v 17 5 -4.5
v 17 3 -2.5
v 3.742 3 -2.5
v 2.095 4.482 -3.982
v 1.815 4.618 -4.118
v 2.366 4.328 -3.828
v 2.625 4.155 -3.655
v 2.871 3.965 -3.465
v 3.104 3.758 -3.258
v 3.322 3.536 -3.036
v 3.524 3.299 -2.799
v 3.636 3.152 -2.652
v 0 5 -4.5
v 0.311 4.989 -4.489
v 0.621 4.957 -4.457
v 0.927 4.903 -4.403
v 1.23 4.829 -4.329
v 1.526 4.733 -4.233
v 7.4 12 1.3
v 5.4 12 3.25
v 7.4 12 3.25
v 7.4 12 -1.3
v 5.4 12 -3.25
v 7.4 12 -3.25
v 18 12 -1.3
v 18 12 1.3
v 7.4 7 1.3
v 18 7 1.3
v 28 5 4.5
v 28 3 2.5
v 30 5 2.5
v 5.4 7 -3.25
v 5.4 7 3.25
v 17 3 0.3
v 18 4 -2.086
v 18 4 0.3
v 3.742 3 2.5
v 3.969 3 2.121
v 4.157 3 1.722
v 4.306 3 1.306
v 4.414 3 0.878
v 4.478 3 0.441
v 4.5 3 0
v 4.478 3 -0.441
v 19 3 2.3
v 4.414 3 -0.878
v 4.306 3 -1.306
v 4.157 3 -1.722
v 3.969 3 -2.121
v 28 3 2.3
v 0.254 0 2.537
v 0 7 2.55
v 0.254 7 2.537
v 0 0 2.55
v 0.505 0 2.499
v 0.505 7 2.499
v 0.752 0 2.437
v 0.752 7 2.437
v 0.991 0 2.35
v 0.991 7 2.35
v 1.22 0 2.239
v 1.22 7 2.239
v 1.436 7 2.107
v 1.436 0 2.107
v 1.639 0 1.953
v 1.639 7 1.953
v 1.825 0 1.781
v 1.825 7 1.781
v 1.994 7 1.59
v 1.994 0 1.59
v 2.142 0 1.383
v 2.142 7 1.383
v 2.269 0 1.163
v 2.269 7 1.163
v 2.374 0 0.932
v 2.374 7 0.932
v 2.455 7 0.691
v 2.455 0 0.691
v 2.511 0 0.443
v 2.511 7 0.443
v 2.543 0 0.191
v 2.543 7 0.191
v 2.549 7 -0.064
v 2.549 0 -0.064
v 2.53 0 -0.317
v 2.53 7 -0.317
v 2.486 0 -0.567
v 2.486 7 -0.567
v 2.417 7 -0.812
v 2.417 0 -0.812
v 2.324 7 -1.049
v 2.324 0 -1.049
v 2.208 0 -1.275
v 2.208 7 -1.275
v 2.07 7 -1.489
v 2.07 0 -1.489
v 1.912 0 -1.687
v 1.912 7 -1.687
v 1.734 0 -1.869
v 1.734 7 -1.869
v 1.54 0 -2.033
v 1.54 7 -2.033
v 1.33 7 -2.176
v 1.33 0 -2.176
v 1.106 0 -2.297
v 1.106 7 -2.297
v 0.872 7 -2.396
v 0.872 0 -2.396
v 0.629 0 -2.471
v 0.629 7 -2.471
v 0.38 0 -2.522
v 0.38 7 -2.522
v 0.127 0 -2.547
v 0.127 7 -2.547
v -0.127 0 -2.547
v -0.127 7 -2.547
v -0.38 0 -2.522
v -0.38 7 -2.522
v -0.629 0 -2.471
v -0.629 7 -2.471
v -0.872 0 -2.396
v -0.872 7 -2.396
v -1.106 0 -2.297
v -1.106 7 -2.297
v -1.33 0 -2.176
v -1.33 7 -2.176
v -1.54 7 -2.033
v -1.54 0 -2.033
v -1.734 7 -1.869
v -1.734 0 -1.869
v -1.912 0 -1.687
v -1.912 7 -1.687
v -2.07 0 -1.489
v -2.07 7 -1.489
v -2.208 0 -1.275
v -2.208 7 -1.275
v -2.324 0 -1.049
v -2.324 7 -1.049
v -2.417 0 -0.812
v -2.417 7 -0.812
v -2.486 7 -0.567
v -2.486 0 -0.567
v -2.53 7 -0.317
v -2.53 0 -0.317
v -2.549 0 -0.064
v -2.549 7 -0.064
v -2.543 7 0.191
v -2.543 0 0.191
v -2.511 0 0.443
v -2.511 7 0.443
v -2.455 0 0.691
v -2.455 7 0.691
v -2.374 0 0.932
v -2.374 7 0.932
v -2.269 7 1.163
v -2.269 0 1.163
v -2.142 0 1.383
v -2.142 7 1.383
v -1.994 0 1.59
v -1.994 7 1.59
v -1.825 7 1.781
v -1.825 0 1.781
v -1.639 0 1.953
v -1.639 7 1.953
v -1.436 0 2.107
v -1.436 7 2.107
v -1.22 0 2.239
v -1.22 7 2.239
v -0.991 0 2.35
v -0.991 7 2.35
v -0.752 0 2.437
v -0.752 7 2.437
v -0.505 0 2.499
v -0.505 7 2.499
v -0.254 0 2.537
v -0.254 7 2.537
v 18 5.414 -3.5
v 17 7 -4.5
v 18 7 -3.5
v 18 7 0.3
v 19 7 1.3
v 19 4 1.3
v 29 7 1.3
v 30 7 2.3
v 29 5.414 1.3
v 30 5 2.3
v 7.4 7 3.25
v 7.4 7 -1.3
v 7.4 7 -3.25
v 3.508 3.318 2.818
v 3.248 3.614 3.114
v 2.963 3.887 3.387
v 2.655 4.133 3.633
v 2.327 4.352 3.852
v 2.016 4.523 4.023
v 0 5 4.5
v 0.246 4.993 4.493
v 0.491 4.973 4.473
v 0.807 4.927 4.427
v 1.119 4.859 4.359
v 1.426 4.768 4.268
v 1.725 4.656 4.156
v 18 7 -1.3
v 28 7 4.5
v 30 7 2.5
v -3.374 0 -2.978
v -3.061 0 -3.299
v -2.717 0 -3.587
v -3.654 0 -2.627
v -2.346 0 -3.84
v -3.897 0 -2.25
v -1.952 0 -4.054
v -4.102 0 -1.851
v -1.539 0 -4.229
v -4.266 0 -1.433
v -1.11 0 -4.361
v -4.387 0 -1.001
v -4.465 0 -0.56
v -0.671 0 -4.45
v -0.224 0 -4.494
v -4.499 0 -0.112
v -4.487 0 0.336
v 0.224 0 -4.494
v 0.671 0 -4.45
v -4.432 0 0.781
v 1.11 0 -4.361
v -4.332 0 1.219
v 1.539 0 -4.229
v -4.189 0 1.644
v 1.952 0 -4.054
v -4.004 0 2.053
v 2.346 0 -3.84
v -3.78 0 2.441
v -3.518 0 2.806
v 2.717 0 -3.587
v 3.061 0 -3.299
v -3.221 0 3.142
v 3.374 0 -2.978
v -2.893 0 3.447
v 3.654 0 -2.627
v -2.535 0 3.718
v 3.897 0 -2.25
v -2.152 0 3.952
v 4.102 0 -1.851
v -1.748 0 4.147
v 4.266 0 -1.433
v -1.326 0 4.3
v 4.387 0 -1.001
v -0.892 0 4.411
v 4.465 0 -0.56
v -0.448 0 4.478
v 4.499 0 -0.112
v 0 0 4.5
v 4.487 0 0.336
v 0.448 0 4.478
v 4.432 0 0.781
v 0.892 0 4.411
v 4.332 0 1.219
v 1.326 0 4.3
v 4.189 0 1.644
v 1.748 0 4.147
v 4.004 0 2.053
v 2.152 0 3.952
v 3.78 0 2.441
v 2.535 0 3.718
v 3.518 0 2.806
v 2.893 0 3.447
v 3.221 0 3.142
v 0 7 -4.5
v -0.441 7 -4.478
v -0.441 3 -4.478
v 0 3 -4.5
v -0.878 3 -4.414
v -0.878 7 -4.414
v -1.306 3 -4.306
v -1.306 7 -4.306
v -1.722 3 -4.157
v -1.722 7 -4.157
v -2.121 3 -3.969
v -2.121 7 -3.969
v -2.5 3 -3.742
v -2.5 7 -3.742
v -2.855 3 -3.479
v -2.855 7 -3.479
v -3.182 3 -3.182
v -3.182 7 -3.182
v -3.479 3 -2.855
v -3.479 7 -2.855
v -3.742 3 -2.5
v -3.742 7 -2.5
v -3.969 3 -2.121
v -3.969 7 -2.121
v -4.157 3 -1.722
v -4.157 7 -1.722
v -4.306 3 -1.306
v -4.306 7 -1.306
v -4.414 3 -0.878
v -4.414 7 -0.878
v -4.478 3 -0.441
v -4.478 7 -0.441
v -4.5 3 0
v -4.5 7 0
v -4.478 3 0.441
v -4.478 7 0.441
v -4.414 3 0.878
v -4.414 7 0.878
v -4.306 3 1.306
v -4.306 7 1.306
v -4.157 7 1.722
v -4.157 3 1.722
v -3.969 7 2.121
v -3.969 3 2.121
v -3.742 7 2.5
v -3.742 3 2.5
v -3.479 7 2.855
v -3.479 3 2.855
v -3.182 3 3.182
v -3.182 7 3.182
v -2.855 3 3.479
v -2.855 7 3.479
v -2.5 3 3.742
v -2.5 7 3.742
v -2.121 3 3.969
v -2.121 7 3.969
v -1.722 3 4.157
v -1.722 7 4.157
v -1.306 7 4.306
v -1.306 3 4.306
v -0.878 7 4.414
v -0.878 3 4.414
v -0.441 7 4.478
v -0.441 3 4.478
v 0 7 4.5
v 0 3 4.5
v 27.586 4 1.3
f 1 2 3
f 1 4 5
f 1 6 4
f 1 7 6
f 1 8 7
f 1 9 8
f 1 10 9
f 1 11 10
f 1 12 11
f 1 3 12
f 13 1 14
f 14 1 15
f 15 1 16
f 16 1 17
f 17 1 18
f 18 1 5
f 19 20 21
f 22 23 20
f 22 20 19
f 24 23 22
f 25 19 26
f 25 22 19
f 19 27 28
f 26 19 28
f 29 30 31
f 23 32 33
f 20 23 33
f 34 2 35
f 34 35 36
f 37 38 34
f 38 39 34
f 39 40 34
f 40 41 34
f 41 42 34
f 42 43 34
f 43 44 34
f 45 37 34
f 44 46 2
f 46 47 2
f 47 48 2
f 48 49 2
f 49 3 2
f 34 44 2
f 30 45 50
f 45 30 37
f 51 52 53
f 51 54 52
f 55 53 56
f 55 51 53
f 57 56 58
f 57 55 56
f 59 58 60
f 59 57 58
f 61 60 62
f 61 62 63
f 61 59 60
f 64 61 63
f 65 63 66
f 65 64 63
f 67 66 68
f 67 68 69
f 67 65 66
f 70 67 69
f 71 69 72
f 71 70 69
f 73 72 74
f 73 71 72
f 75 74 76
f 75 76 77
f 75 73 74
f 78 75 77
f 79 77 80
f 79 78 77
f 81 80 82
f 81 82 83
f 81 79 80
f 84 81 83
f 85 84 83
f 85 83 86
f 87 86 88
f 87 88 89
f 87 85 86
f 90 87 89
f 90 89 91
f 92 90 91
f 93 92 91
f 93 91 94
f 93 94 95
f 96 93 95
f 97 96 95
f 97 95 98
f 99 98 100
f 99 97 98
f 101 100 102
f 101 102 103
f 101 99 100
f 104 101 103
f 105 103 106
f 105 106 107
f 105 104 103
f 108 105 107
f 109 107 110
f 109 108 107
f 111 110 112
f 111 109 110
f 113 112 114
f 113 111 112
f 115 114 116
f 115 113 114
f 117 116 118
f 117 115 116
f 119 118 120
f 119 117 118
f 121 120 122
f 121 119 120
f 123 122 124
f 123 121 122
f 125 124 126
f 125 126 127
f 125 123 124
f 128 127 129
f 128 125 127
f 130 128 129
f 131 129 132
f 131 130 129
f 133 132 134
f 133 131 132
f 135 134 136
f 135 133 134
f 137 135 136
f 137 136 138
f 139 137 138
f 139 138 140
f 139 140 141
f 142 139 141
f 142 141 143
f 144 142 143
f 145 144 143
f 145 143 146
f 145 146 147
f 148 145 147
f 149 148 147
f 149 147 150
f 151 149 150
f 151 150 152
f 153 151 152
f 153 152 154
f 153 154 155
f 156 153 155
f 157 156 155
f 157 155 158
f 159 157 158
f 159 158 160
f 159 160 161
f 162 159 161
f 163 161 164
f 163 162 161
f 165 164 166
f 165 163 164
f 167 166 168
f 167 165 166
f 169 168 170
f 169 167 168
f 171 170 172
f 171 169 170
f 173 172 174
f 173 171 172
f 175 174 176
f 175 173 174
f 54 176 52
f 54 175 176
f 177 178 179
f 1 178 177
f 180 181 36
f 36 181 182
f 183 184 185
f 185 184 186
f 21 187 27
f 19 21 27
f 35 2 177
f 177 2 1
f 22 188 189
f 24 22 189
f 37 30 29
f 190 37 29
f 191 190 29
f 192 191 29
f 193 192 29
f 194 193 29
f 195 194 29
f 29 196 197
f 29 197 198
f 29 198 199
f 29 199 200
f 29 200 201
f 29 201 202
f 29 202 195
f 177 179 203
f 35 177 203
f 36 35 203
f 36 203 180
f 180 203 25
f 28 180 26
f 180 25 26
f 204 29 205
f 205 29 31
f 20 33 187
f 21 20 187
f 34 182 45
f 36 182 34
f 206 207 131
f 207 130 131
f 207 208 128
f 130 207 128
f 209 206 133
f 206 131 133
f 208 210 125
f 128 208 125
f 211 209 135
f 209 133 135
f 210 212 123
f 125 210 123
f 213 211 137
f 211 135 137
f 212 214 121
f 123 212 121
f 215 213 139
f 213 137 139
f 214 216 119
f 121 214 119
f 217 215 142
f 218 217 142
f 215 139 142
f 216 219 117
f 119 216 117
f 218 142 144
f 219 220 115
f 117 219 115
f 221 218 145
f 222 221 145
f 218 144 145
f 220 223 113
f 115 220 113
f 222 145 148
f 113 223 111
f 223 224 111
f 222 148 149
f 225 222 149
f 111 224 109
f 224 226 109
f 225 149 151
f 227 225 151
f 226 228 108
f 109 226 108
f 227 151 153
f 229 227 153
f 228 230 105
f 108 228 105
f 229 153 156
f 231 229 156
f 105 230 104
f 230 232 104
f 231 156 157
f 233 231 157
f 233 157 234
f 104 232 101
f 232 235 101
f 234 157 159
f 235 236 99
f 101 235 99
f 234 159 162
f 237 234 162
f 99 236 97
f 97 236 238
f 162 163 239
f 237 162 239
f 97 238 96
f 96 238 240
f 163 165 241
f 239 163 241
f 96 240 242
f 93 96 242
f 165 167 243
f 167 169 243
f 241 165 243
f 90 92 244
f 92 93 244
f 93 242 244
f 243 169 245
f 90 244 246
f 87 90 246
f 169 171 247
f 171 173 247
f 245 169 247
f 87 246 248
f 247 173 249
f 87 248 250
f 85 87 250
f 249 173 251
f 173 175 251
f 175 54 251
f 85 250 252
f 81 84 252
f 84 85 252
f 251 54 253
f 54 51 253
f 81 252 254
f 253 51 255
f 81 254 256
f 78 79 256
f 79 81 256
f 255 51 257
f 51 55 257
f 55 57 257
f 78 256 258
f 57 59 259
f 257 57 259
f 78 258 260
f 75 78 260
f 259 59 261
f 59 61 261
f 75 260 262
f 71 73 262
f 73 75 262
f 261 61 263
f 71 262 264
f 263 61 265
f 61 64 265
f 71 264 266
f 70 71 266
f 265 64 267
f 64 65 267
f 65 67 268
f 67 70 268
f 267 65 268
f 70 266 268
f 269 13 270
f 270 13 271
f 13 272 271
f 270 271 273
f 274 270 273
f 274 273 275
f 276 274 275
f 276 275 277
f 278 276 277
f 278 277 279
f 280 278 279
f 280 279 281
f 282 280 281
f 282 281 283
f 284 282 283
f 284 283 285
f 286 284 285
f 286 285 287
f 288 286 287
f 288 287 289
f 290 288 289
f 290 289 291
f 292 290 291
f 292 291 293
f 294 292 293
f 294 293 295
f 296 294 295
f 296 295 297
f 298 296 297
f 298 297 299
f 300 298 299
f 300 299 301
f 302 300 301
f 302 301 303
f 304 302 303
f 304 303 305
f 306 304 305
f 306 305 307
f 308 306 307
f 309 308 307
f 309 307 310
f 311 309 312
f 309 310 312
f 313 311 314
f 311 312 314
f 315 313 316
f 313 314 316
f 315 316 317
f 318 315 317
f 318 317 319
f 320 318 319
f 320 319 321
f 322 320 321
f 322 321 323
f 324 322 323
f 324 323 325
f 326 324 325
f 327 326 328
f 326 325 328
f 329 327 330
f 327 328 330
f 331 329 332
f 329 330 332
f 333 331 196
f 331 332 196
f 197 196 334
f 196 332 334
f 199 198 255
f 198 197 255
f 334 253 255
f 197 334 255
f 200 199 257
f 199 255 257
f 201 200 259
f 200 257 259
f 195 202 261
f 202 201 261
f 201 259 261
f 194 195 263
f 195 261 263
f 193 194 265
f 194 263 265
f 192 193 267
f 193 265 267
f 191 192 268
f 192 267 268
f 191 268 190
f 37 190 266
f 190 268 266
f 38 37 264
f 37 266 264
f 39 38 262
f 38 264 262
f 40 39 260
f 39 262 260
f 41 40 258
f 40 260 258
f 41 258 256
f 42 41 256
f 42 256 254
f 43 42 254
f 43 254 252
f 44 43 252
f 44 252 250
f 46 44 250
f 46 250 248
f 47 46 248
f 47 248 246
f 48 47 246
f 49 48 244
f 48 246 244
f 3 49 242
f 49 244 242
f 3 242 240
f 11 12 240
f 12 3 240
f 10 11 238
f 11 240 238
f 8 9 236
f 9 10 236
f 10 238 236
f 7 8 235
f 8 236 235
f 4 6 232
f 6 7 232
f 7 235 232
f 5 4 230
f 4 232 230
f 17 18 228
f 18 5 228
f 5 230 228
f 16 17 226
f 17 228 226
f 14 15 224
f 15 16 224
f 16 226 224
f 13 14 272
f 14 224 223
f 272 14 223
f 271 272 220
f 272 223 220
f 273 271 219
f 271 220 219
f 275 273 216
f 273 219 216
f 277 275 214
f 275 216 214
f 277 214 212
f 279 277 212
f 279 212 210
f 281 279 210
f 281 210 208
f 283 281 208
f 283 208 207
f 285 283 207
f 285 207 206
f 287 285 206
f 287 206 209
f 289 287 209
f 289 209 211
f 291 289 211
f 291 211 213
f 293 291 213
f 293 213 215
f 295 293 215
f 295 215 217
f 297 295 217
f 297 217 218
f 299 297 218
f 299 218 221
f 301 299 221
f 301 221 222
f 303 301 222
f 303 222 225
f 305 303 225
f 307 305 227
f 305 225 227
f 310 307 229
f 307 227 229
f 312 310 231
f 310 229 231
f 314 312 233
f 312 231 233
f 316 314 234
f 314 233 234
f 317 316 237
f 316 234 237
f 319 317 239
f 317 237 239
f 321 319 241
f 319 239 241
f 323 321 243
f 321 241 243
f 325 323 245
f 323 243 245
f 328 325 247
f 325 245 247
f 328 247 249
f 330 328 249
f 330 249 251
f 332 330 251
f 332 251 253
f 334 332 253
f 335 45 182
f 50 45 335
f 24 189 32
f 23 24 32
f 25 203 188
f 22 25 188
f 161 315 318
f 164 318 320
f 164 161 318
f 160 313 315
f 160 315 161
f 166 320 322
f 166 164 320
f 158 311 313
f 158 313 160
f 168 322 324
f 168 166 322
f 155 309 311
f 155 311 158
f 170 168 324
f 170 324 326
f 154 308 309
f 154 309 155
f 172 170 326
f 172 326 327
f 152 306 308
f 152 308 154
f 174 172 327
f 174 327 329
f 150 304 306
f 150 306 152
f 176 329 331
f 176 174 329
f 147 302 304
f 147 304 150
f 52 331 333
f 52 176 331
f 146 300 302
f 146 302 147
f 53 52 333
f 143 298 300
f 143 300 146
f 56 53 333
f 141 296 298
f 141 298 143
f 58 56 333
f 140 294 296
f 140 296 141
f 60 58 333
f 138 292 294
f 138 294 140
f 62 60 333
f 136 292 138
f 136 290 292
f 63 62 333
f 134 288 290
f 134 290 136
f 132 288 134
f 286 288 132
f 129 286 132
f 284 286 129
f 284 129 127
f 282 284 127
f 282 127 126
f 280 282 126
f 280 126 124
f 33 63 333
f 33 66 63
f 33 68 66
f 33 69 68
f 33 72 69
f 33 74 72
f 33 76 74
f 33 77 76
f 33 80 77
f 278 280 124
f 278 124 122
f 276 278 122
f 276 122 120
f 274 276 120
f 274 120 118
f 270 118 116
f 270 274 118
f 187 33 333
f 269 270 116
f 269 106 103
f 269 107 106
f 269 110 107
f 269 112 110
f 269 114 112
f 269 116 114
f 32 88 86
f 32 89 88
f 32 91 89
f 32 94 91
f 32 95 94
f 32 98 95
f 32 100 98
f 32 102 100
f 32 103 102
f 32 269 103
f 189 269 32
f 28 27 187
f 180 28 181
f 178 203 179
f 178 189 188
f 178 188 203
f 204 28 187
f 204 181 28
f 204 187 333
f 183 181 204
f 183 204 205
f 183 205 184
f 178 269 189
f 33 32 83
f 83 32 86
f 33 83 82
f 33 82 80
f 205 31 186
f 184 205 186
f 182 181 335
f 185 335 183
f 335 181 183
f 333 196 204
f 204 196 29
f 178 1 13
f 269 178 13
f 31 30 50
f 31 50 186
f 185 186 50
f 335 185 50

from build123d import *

# Parameters (mm, degrees)
SKETCH1_R           = 4.5
SKETCH1_R_2         = 2.55
BOSS_EXTRUDE1_DEPTH = 3
SKETCH2_R           = 2.55
BOSS_EXTRUDE2_DEPTH = 4
CHAMFER1_SIZE       = 2
CUT_EXTRUDE1_DEPTH  = 32.132780152
BOSS_EXTRUDE4_DEPTH = 5
CHAMFER2_SIZE       = 1


with BuildPart() as part:
    # Sketch1 → Boss-Extrude1 (new body)
    with BuildSketch(Plane(origin=(0, 0, 0), x_dir=(1, 0, 0), z_dir=(0, 1, 0))):
        with Locations(Location((0, 0, 0), (0, 0, 270))):
            Circle(SKETCH1_R)
        with Locations(Location((0, 0, 0), (0, 0, 270))):
            Circle(SKETCH1_R_2, mode=Mode.SUBTRACT)
    extrude(amount=BOSS_EXTRUDE1_DEPTH)

    # Sketch2 → Boss-Extrude2 (add)
    with BuildSketch(Plane(origin=(0, 3, 0), x_dir=(1, 0, 0), z_dir=(0, 1, 0))):
        with BuildLine():
            Line((0, -4.5), (30, -4.5))
            Line((30, -4.5), (30, 4.5))
            Line((30, 4.5), (0, 4.5))
            ThreePointArc((0, 4.5), (-4.5, 0), (0, -4.5))
        make_face()
        with Locations(Location((0, 0, 0), (0, 0, 270))):
            Circle(SKETCH2_R, mode=Mode.SUBTRACT)
    extrude(amount=BOSS_EXTRUDE2_DEPTH)

    # Chamfer1
    # the kernel refuses this chamfer: 2 mm, written as the material it takes off along each edge
    with BuildSketch(Plane(origin=(28.666666667, 4.333333333, 3.166666667), x_dir=(-0.7071067811865475, -0.7071067811865475, 0), z_dir=(0.5773502691896256, -0.5773502691896258, 0.5773502691896258))) as chamfer1_piece_1:
        Polygon((-1.414213562, 0.816496581), (1.414213562, 0.816496581), (0, -1.632993162), align=None)
    extrude(amount=2.540341184, mode=Mode.SUBTRACT)
    with BuildSketch(Plane(origin=(28.666666667, 4.333333333, -3.166666667), x_dir=(-0.7071067811865476, -0.7071067811865475, 0), z_dir=(0.5773502691896256, -0.5773502691896258, -0.5773502691896257))) as chamfer1_piece_2:
        Polygon((-1.414213562, -0.816496581), (1.414213562, -0.816496581), (0, 1.632993162), align=None)
    extrude(amount=2.540341184, mode=Mode.SUBTRACT)
    with BuildSketch(Plane(origin=(-5.143365976, 3, 4.5), x_dir=(0, -0.027495876610586275, -0.9996219169112968), z_dir=(1, 0, 0))) as chamfer1_piece_3_section:
        Polygon((CHAMFER1_SIZE * 0.999621916911, CHAMFER1_SIZE * 0.0274958766106), (-CHAMFER1_SIZE * 0.0274958766106, CHAMFER1_SIZE * 0.999621916911), (0, 0), align=None)
    chamfer1_piece_3 = extrude(amount=40.286731952, mode=Mode.PRIVATE)
    chamfer1_piece_3 = chamfer1_piece_3 - Plane(origin=(0, 3.673505516, 0), x_dir=(0, 0, 1), z_dir=(0, -1, 0)) * Cylinder(4.5, 89, mode=Mode.PRIVATE)
    add(chamfer1_piece_3, mode=Mode.SUBTRACT)
    with BuildSketch(Plane(origin=(30, 3, 9.643365976), x_dir=(-0.9996219169112968, -0.027495876610586296, 0), z_dir=(0, 0, -1))) as chamfer1_piece_4:
        Polygon((CHAMFER1_SIZE * 0.999621916911, CHAMFER1_SIZE * 0.0274958766106), (-CHAMFER1_SIZE * 0.0274958766106, CHAMFER1_SIZE * 0.999621916911), (0, 0), align=None)
    extrude(amount=19.286731952, mode=Mode.SUBTRACT)
    with BuildSketch(Plane(origin=(30, -2.143365976, 4.5), x_dir=(-0.9996219169112968, 0, 0.02749587661058651), z_dir=(0, 1, 0))) as chamfer1_piece_5:
        Polygon((CHAMFER1_SIZE * 0.999621916911, -CHAMFER1_SIZE * 0.0274958766106), (-CHAMFER1_SIZE * 0.0274958766106, -CHAMFER1_SIZE * 0.999621916911), (0, 0), align=None)
    extrude(amount=14.286731952, mode=Mode.SUBTRACT)
    with BuildSketch(Plane(origin=(35.143365976, 3, -4.5), x_dir=(0, -0.027495876610586275, 0.9996219169112968), z_dir=(-1, 0, 0))) as chamfer1_piece_6_section:
        Polygon((CHAMFER1_SIZE * 0.999621916911, CHAMFER1_SIZE * 0.0274958766106), (-CHAMFER1_SIZE * 0.0274958766106, CHAMFER1_SIZE * 0.999621916911), (0, 0), align=None)
    chamfer1_piece_6 = extrude(amount=40.286731952, mode=Mode.PRIVATE)
    chamfer1_piece_6 = chamfer1_piece_6 - Plane(origin=(0, 3.673505518, 0), x_dir=(0, 0, 1), z_dir=(0, -1, 0)) * Cylinder(4.5, 89, mode=Mode.PRIVATE)
    add(chamfer1_piece_6, mode=Mode.SUBTRACT)
    with BuildSketch(Plane(origin=(30, -2.143365976, -4.5), x_dir=(-0.9996219169112968, 0, -0.02749587661058651), z_dir=(0, 1, 0))) as chamfer1_piece_7:
        Polygon((CHAMFER1_SIZE * 0.999621916911, CHAMFER1_SIZE * 0.0274958766106), (-CHAMFER1_SIZE * 0.0274958766106, CHAMFER1_SIZE * 0.999621916911), (0, 0), align=None)
    extrude(amount=14.286731952, mode=Mode.SUBTRACT)

    # Sketch3 → Cut-Extrude1 (cut, through all)
    with BuildSketch(Plane(origin=(0, 7, 0), x_dir=(1, 0, 0), z_dir=(0, 1, 0))):
        Polygon((18, 1.3), (18, -1.3), (30, -1.3), (30, 2.5), (28, 4.5), (18, 4.5), align=None)
    extrude(amount=-CUT_EXTRUDE1_DEPTH, mode=Mode.SUBTRACT)

    # Sketch3<4> → Boss-Extrude4 (add)
    with BuildSketch(Plane(origin=(0, 7, 0), x_dir=(1, 0, 0), z_dir=(0, 1, 0))):
        Polygon((5.4, 3.25), (5.4, -3.25), (7.4, -3.25), (7.4, -1.3), (18, -1.3), (18, 1.3), (7.4, 1.3), (7.4, 3.25), align=None)
    extrude(amount=BOSS_EXTRUDE4_DEPTH)

    # Chamfer2
    chamfer2_edges = [part.edges().sort_by_distance(p)[0] for p in [
        (29, 4, 1.3),
        (18, 4, -3.5),
        (18, 5, 1.3),
        (30, 6, 1.3),
        (23, 3, 1.3),
        (18, 3, -0.6),
        (18, 6, -4.5),
    ]]
    chamfer(chamfer2_edges, length=CHAMFER2_SIZE)


solid = part.part
